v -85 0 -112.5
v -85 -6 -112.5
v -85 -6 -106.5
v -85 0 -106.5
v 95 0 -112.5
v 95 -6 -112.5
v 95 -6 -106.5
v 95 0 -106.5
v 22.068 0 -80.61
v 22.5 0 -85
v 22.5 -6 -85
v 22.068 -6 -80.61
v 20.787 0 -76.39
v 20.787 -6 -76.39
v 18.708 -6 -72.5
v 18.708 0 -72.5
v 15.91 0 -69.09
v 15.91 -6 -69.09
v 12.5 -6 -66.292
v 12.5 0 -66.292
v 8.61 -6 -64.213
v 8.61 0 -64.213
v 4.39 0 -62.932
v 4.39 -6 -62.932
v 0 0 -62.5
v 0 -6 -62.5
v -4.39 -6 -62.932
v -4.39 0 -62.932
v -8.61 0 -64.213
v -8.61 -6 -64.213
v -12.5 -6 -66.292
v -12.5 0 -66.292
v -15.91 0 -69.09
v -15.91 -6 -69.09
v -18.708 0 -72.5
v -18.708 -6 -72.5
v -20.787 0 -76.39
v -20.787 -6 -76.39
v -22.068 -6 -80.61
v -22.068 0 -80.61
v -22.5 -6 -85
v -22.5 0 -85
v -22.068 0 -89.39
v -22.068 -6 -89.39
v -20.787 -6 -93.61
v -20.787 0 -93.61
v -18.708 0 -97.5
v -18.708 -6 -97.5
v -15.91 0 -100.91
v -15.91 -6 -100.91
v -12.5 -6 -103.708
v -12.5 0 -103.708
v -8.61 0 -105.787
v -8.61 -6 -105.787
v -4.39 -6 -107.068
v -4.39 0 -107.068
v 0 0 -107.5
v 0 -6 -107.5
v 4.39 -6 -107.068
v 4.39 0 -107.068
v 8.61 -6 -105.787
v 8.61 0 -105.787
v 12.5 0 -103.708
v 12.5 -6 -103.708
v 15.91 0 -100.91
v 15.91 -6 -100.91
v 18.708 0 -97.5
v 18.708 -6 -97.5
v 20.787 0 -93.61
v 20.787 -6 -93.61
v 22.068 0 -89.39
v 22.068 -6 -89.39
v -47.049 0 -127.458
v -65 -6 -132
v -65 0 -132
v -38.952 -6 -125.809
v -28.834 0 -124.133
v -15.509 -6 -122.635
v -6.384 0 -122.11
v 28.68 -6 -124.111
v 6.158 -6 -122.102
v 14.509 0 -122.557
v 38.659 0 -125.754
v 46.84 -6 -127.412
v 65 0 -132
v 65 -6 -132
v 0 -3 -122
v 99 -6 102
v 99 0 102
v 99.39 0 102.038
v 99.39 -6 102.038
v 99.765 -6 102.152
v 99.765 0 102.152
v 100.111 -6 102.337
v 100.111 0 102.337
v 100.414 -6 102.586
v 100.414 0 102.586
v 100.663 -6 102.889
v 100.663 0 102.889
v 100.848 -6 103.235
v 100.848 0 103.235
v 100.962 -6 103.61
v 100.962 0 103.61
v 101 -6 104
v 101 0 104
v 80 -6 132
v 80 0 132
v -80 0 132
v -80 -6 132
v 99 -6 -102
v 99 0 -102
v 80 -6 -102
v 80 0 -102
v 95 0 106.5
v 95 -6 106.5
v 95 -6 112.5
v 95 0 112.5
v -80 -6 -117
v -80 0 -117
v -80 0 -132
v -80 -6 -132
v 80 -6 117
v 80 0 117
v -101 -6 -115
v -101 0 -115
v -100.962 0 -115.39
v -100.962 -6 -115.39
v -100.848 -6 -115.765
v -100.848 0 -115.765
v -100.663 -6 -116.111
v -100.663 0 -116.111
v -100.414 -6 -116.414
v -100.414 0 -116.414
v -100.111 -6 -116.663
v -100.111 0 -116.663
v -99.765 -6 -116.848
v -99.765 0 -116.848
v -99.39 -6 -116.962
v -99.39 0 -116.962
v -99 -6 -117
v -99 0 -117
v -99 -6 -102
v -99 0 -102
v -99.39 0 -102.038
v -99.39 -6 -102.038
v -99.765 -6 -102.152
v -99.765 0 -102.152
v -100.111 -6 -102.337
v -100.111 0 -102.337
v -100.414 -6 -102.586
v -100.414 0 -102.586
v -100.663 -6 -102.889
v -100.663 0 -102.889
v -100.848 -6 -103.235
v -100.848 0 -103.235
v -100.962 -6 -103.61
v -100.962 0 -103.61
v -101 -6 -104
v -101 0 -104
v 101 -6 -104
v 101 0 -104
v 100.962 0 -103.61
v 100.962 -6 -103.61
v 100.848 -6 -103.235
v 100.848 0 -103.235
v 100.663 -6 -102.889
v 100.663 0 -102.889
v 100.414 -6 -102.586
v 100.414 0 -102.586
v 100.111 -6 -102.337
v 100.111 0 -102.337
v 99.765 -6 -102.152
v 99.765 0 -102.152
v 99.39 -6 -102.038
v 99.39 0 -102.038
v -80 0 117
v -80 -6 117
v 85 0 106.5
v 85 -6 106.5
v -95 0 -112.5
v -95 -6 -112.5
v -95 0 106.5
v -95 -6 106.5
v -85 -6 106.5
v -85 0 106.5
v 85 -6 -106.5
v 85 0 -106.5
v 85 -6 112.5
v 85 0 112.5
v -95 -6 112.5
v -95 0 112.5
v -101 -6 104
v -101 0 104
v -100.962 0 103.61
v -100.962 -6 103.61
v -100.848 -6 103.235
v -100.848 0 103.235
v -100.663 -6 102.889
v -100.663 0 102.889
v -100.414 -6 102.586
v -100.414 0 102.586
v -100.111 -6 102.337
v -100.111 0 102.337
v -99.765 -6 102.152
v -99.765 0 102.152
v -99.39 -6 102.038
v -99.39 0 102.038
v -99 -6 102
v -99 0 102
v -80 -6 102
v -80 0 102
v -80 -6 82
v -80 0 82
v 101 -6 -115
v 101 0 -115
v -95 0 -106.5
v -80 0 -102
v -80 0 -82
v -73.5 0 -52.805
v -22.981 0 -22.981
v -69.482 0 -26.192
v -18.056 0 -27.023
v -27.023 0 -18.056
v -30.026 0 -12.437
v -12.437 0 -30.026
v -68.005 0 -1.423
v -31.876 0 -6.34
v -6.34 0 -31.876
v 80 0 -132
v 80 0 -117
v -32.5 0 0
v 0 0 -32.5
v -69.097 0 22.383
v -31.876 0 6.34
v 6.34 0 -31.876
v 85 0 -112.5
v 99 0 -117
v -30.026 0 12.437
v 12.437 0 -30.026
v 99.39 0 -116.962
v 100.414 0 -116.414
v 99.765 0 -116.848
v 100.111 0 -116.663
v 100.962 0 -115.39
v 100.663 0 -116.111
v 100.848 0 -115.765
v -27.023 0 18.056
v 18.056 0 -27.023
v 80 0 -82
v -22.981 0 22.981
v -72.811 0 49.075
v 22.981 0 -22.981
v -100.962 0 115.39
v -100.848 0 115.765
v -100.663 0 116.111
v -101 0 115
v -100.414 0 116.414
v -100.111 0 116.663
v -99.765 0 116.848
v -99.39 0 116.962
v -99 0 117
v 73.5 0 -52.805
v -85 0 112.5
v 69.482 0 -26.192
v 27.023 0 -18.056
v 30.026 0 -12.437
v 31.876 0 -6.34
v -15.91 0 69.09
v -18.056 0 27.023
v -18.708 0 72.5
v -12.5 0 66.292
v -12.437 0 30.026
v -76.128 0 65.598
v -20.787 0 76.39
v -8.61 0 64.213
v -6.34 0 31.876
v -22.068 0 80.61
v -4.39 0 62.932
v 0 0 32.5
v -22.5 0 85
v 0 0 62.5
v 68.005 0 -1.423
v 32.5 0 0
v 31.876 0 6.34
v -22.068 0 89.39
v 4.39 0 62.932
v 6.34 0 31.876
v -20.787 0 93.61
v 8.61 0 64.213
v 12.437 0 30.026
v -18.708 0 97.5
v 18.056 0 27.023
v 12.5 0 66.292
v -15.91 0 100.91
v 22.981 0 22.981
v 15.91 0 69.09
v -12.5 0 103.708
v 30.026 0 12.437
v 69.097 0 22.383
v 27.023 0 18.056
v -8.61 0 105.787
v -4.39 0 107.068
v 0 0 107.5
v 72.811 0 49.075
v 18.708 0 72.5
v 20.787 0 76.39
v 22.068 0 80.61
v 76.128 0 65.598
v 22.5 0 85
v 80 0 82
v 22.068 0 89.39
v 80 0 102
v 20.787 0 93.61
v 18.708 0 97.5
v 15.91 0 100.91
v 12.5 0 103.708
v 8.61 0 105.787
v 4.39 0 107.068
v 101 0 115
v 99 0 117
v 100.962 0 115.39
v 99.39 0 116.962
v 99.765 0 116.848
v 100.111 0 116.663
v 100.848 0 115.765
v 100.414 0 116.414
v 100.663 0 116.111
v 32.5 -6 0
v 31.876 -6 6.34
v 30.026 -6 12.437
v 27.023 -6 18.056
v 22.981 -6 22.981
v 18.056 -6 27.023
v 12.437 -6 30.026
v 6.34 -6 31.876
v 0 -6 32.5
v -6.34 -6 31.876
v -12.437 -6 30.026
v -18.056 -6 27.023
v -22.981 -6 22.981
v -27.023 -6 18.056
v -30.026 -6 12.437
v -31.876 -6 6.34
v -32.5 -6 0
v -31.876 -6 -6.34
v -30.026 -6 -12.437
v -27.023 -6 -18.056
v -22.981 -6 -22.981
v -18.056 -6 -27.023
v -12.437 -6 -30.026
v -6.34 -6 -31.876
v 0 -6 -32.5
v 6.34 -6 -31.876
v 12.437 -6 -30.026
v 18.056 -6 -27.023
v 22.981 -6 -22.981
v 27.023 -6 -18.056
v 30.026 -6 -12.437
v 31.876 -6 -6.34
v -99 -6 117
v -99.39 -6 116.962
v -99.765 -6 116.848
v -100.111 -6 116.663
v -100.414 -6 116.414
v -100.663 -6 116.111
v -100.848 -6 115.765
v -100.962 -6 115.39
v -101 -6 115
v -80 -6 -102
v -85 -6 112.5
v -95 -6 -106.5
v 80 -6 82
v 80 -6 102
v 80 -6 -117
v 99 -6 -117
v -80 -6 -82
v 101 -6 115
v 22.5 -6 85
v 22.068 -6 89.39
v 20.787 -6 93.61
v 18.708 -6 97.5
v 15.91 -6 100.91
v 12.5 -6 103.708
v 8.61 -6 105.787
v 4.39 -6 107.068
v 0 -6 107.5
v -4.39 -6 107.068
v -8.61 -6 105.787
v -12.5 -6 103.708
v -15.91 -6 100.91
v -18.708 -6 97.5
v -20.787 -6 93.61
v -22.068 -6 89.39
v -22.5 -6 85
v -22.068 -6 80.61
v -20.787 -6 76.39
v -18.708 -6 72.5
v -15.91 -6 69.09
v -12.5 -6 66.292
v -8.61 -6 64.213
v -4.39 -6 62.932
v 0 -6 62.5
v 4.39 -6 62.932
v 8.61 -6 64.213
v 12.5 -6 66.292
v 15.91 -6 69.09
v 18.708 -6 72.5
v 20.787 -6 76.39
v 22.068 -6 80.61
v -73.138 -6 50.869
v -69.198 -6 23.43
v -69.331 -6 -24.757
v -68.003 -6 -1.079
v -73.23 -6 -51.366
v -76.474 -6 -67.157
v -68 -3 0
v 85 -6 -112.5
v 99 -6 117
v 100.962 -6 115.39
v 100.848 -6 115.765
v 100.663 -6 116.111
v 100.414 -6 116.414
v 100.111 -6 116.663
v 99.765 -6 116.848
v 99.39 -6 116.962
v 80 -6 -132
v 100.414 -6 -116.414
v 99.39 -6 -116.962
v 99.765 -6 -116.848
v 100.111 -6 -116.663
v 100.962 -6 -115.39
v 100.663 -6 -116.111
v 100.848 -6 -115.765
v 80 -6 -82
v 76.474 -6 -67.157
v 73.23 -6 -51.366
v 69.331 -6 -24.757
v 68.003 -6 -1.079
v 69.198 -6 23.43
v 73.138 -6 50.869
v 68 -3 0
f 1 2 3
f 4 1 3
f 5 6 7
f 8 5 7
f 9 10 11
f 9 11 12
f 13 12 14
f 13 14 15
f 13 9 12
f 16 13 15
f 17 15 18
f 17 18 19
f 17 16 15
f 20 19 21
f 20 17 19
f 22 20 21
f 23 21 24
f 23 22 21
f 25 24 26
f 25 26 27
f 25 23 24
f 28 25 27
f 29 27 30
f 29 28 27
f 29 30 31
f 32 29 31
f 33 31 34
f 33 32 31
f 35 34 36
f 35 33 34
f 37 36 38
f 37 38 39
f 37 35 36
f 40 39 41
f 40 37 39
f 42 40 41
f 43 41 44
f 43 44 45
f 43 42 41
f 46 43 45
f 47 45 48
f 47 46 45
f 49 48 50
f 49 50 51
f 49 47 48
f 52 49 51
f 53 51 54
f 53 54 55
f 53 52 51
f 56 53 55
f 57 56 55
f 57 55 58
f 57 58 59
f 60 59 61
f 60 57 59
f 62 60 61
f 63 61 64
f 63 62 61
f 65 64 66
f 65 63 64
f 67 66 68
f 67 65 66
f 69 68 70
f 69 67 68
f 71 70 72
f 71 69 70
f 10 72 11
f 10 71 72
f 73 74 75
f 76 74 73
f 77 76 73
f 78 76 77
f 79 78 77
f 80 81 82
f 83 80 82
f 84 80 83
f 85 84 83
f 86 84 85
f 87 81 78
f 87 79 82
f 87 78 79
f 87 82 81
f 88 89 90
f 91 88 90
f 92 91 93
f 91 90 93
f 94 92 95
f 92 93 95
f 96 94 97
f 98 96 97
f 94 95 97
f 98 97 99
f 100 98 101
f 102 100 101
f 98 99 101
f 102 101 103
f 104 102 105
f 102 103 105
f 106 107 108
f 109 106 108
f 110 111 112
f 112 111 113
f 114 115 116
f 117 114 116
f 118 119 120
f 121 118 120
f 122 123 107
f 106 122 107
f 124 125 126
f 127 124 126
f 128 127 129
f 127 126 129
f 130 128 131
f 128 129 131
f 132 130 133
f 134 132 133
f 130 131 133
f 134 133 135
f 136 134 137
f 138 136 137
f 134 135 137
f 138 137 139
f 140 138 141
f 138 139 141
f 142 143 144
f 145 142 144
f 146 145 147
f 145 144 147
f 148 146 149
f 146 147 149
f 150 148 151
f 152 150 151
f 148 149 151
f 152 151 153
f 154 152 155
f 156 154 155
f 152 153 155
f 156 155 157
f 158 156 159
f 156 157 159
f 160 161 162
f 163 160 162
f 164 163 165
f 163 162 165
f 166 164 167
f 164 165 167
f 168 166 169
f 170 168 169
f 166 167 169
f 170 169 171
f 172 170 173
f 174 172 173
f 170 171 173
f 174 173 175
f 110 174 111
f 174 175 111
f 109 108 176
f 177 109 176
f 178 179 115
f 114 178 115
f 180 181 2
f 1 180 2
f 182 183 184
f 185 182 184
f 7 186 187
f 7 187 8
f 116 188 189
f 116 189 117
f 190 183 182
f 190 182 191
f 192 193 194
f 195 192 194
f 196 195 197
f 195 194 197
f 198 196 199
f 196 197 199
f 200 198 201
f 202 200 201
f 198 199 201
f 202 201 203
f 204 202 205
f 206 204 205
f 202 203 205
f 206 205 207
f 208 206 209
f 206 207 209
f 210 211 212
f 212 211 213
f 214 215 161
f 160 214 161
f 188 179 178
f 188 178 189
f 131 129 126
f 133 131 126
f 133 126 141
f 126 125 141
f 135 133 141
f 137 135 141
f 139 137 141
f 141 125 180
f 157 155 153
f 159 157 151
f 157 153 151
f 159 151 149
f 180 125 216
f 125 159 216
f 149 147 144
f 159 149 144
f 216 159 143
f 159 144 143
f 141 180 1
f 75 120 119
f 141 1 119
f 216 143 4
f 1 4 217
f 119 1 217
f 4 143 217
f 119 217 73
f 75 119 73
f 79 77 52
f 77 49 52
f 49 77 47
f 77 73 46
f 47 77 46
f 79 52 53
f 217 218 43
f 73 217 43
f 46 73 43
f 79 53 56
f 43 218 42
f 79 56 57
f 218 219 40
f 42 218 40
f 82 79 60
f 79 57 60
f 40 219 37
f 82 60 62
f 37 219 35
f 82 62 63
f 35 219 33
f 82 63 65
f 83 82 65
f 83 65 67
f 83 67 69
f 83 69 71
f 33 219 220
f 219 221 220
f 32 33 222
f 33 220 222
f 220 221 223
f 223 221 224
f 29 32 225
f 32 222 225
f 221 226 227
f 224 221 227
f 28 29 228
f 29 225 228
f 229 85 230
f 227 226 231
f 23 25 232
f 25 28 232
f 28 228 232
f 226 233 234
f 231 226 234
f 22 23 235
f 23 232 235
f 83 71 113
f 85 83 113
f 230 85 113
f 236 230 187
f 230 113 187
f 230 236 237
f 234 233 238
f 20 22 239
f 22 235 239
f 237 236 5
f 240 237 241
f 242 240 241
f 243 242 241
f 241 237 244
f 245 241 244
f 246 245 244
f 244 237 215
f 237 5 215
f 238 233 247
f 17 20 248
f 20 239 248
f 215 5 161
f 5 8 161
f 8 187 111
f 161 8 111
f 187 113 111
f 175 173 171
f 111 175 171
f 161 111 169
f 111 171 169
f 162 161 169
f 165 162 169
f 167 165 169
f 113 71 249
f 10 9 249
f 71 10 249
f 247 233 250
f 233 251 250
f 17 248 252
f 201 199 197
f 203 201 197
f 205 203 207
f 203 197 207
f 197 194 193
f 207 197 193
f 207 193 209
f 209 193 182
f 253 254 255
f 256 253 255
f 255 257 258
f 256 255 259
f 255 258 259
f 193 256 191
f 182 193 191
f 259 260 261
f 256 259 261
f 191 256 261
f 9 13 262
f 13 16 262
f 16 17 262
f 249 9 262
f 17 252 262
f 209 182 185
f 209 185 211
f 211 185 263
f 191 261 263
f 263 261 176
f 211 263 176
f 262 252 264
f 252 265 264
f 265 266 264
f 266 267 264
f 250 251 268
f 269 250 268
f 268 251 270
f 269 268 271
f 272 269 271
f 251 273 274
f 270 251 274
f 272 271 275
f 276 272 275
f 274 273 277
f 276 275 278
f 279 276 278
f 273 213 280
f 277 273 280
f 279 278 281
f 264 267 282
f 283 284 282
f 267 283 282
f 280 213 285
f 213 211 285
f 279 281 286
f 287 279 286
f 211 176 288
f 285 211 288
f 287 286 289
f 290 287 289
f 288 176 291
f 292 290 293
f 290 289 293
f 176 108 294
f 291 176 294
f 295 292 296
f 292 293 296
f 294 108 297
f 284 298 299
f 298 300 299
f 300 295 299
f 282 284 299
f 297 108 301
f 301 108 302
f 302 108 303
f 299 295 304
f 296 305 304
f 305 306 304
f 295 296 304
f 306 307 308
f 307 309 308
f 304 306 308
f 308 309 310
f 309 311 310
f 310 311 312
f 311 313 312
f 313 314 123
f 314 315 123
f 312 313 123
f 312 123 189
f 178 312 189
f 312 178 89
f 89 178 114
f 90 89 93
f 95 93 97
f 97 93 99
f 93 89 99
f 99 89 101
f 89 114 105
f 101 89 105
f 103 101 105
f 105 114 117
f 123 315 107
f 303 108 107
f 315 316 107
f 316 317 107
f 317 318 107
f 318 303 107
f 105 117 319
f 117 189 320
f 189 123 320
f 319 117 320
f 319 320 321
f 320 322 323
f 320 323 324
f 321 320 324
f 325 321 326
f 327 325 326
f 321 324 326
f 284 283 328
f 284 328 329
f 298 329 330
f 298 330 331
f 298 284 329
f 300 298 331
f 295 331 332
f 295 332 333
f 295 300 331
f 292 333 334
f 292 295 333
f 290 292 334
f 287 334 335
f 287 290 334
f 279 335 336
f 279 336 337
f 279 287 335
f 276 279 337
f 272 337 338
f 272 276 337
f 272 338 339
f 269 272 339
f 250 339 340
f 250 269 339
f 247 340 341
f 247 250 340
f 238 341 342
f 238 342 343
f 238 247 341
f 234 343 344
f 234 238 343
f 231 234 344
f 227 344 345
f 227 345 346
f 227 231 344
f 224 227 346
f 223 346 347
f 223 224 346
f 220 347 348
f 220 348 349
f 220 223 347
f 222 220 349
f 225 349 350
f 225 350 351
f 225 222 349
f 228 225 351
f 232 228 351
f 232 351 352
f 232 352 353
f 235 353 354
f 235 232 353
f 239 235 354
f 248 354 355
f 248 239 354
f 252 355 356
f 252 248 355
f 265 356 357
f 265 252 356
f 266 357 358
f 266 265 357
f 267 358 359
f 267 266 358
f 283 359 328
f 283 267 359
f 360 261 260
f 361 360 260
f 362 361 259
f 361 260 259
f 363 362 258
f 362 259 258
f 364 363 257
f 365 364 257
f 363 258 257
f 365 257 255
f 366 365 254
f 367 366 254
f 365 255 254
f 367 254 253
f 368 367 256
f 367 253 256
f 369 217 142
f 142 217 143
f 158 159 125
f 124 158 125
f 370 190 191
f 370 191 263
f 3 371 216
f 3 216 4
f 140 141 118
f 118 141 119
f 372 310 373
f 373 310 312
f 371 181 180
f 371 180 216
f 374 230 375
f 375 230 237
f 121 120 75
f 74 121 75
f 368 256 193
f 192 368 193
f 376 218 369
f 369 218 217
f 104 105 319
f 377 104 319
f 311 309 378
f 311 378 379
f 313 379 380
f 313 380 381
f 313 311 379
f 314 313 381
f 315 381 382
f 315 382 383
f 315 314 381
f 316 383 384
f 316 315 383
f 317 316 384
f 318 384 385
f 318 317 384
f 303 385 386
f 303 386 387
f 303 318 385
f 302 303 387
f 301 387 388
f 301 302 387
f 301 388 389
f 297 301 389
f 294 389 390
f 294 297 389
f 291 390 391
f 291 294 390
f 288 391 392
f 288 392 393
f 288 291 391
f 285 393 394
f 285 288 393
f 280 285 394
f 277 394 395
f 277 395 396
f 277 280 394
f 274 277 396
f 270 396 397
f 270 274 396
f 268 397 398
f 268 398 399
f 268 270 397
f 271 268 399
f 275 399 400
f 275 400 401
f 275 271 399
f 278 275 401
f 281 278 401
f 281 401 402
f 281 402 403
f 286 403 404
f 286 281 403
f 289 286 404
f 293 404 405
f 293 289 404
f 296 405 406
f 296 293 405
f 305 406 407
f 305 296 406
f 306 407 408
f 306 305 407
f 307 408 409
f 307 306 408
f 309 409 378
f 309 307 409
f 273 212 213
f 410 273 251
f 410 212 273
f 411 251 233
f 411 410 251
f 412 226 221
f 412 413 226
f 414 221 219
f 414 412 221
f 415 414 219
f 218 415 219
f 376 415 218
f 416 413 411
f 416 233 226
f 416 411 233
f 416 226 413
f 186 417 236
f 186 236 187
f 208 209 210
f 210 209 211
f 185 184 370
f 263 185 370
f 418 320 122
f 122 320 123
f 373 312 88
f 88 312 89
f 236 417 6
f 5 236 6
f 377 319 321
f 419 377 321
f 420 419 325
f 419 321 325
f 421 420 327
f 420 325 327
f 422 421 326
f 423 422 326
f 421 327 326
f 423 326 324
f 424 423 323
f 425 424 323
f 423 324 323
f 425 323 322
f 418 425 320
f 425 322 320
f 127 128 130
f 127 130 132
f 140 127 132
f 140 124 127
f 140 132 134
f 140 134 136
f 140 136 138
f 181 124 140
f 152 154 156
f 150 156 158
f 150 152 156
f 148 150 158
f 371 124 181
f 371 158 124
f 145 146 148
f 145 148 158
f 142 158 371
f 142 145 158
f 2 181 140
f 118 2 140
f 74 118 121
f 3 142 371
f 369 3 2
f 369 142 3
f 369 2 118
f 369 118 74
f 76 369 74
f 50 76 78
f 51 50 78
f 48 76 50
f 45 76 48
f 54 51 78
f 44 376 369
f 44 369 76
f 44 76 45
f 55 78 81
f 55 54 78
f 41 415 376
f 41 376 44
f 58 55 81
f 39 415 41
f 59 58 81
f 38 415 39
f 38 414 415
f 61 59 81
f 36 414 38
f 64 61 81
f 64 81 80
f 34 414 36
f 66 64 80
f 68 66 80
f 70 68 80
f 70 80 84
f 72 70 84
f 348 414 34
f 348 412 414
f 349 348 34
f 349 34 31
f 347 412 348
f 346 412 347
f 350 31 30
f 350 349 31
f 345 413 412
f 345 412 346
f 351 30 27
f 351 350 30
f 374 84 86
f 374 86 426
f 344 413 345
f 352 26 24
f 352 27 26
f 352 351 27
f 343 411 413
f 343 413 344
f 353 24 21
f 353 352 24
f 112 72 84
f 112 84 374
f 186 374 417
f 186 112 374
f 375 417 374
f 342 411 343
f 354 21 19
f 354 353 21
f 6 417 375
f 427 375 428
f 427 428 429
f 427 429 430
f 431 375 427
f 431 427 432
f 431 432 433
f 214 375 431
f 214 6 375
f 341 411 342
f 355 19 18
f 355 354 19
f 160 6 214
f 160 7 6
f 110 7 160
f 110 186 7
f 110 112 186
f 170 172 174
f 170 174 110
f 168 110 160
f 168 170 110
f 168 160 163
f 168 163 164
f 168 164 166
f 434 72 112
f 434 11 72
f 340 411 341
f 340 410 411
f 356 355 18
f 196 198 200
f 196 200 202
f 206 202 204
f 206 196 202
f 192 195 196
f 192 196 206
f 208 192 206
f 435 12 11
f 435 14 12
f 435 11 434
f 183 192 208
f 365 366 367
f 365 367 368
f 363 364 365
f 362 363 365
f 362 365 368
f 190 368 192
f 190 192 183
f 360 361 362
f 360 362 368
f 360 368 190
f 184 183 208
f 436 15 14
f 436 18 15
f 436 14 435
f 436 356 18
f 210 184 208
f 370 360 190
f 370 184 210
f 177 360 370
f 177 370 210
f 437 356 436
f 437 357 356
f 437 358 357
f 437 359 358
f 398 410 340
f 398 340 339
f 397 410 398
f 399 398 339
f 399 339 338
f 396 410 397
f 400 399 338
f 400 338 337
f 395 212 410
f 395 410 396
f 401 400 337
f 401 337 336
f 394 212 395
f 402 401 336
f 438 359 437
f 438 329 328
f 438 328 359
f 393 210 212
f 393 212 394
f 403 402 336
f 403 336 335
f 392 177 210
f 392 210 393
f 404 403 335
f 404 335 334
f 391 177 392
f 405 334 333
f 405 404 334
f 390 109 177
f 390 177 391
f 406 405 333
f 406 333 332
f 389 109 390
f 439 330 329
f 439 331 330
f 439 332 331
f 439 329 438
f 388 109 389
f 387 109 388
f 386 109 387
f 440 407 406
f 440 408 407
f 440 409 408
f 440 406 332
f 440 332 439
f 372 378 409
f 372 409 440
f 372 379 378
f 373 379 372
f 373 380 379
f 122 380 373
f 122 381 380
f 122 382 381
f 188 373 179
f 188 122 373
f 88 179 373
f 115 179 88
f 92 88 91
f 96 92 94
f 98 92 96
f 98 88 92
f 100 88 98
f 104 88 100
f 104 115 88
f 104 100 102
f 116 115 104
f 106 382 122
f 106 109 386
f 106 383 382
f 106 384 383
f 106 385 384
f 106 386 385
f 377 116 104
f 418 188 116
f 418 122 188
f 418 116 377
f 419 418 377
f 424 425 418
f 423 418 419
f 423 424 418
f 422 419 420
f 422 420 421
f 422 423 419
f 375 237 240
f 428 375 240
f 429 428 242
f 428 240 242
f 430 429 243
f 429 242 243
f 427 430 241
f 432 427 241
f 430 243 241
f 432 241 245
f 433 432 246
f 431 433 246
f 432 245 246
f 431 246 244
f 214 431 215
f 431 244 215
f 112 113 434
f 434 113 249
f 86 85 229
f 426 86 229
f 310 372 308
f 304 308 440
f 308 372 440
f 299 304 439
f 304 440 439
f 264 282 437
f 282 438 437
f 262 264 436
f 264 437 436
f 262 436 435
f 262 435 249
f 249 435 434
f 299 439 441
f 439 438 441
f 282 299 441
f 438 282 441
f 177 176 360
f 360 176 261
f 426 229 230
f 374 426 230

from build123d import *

# Parameters (mm, degrees)
F0_R     = 22.5
F0_R_2   = 32.5
F1_DEPTH = 6
F2_W     = 10
F2_H     = 6
F3_DEPTH = 25
F5_DEPTH = 25


with BuildPart() as f1:
    # F0 (on Front) → F1 (new body)
    with BuildSketch(Plane.XZ):
        Polygon((80, 132), (-80, 132), (-80, 117), (-80, 102), (-80, 74.3303437366), (-80, -102), (-80, -117), (-80, -132), (80, -132), (80, -117), (80, -102), (80, -74.3303437366), (80, 102), (80, 117), align=None)
        with Locations((0, -85)):
            Circle(F0_R, mode=Mode.SUBTRACT)
        Circle(F0_R_2, mode=Mode.SUBTRACT)
        with Locations((0, 85)):
            Circle(F0_R, mode=Mode.SUBTRACT)
        with BuildLine():
            Line((-80, 102), (-80, 117))
            Line((-80, 117), (-99, 117))
            ThreePointArc((-99, 117), (-100.4142135624, 116.4142135624), (-101, 115))
            Line((-101, 115), (-101, 104))
            ThreePointArc((-101, 104), (-100.4142135624, 102.5857864376), (-99, 102))
            Line((-99, 102), (-80, 102))
        make_face()
        with BuildLine():
            Line((99, 117), (80, 117))
            Line((80, 117), (80, 102))
            Line((80, 102), (99, 102))
            ThreePointArc((99, 102), (100.4142135624, 102.5857864376), (101, 104))
            Line((101, 104), (101, 115))
            ThreePointArc((101, 115), (100.4142135624, 116.4142135624), (99, 117))
        make_face()
        with BuildLine():
            Line((-80, -117), (-80, -102))
            Line((-80, -102), (-99, -102))
            ThreePointArc((-99, -102), (-100.4142135624, -102.5857864376), (-101, -104))
            Line((-101, -104), (-101, -115))
            ThreePointArc((-101, -115), (-100.4142135624, -116.4142135624), (-99, -117))
            Line((-99, -117), (-80, -117))
        make_face()
        with BuildLine():
            Line((99, -102), (80, -102))
            Line((80, -102), (80, -117))
            Line((80, -117), (99, -117))
            ThreePointArc((99, -117), (100.4142135624, -116.4142135624), (101, -115))
            Line((101, -115), (101, -104))
            ThreePointArc((101, -104), (100.4142135624, -102.5857864376), (99, -102))
        make_face()
    extrude(amount=F1_DEPTH)

    # F2 (on face) → F3 (cut)
    with BuildSketch(Plane.XZ.offset(6)):
        with Locations((-90, 109.5)):
            Rectangle(F2_W, F2_H)
        with Locations((90, 109.5)):
            Rectangle(F2_W, F2_H)
        with Locations((-90, -109.5)):
            Rectangle(F2_W, F2_H)
        with Locations((90, -109.5)):
            Rectangle(F2_W, F2_H)
    extrude(amount=-F3_DEPTH, mode=Mode.SUBTRACT)

    # F4 (on face) → F5 (cut)
    with BuildSketch(Plane.XZ.offset(6)):
        with BuildLine():
            add(Edge.make_bspline(
                [(-65, -132), (-43.3333333333, -125.837706387), (0, -118.162293613), (43.3333333333, -125.837706387), (65, -132)],
                knots=[0, 0, 0, 0, 0.5, 1, 1, 1, 1], degree=3))
            Line((-65, -132), (-65, -149.1421461105))
            Line((-65, -149.1421461105), (65, -149.1421461105))
            Line((65, -149.1421461105), (65, -132))
        make_face()
        with BuildLine():
            Line((104.2380854487, 82), (80, 82))
            add(Edge.make_bspline(
                [(80, 82), (74, 58), (62, 0), (74, -58), (80, -82)],
                knots=[0, 0, 0, 0, 0.5, 1, 1, 1, 1], degree=3))
            Line((80, -82), (104.2380854487, -82))
            Line((104.2380854487, -82), (104.2380854487, 82))
        make_face()
        with BuildLine():
            add(Edge.make_bspline(
                [(-80, 82), (-74, 58), (-62, 0), (-74, -58), (-80, -82)],
                knots=[0, 0, 0, 0, 0.5, 1, 1, 1, 1], degree=3))
            Line((-80, 82), (-104.2380854487, 82))
            Line((-104.2380854487, 82), (-104.2380854487, -82))
            Line((-104.2380854487, -82), (-80, -82))
        make_face()
    extrude(amount=-F5_DEPTH, mode=Mode.SUBTRACT)


solid = f1.part
